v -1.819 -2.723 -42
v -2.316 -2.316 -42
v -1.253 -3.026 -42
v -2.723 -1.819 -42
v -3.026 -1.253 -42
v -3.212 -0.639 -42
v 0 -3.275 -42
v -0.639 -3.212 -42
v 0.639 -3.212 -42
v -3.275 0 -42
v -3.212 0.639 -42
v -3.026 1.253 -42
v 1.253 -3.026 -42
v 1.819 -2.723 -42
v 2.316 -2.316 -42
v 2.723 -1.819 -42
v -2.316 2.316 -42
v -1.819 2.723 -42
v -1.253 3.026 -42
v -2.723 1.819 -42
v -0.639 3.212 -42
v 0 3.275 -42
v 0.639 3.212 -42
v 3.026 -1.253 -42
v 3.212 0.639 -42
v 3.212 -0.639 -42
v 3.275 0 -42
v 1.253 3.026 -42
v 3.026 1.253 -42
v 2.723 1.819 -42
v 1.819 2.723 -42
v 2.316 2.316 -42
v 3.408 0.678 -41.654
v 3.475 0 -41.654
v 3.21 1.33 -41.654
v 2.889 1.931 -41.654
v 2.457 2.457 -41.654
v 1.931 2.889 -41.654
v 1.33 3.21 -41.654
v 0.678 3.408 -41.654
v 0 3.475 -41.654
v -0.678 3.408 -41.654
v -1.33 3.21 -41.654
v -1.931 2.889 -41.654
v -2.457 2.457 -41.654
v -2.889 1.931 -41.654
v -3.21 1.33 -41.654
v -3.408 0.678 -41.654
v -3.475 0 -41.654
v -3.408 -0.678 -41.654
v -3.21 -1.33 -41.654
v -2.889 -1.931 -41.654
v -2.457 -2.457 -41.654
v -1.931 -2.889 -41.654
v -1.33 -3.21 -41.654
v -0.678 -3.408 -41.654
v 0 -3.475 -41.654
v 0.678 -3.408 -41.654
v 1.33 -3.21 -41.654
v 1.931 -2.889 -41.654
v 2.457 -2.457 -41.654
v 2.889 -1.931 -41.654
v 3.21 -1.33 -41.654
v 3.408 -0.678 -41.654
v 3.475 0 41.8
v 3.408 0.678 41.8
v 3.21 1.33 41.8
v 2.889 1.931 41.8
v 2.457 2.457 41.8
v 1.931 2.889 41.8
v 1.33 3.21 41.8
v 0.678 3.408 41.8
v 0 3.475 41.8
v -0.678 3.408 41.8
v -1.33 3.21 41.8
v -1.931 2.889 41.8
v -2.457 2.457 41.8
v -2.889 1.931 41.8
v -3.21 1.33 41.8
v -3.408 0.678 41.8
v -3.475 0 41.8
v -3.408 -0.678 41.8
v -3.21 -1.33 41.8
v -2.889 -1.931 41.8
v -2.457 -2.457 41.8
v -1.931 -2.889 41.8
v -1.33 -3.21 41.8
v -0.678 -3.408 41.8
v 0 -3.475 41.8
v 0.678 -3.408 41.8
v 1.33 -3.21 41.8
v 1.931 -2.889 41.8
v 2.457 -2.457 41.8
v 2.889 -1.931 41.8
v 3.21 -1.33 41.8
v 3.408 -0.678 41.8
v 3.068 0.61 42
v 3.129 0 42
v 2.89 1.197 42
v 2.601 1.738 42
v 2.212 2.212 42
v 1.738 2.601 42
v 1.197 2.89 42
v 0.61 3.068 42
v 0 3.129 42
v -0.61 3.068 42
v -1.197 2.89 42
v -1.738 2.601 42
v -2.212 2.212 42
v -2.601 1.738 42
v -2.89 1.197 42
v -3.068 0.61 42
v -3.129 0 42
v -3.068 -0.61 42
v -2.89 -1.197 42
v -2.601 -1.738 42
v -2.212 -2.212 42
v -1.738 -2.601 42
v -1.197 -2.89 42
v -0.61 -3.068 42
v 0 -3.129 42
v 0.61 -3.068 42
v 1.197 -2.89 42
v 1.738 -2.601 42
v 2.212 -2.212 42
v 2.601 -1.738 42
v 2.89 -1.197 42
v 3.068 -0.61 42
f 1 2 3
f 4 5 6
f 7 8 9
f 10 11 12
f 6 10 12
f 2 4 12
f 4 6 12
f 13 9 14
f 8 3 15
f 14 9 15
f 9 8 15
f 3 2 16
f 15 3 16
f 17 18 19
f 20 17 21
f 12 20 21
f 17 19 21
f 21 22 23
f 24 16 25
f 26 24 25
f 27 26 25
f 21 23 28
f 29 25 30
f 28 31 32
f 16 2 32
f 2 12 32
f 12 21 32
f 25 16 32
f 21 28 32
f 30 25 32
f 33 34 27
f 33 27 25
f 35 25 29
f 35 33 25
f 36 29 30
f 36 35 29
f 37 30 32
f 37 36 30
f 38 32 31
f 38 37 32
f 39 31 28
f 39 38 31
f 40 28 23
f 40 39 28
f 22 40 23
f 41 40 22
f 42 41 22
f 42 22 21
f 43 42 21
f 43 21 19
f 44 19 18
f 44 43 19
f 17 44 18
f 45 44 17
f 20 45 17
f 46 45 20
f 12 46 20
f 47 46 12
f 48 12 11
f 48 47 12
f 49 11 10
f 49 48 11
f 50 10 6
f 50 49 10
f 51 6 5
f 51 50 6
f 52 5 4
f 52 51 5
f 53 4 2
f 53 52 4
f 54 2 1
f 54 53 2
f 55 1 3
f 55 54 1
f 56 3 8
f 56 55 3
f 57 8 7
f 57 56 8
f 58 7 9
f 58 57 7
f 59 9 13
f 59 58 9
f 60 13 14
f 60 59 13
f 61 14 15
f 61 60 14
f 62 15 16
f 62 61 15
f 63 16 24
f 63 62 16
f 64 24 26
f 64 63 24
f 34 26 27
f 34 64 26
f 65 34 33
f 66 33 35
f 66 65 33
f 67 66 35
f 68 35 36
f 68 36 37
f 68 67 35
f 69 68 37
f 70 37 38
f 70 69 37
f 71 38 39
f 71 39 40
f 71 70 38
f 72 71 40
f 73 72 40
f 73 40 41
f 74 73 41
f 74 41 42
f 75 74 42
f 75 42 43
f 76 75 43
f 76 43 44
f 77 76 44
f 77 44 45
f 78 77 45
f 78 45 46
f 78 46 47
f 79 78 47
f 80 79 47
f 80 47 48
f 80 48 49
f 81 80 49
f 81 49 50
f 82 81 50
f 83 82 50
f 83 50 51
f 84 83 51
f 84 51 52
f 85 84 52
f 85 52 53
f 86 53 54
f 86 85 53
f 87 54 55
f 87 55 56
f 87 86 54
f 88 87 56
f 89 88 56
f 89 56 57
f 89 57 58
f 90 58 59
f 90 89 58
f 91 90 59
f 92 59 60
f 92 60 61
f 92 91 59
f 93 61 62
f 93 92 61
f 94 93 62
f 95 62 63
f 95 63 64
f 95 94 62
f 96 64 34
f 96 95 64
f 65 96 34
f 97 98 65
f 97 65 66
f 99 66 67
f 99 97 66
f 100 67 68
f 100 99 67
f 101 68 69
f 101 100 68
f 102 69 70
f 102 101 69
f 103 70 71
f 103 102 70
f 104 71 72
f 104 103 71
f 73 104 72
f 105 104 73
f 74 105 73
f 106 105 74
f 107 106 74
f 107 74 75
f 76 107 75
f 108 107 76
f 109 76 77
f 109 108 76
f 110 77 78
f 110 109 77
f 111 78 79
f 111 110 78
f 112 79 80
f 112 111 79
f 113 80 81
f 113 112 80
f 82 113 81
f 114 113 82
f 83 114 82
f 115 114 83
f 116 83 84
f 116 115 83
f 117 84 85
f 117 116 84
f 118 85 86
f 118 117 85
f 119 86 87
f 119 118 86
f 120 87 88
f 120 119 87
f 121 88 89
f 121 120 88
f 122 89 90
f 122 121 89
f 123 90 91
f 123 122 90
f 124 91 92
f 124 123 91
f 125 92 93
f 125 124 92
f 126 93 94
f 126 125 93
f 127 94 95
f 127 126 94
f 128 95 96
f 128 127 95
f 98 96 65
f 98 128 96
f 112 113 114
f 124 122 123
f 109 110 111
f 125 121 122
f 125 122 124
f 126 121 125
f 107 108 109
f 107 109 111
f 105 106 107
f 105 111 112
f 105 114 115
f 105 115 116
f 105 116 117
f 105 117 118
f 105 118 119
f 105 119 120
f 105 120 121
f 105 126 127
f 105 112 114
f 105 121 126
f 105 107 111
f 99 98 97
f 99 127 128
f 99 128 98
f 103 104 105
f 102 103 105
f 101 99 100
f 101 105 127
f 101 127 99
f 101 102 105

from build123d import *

# Parameters (mm, degrees)
SKETCH1_R             = 3.475
BOSS_EXTRUDE1_DEPTH   = 42
CHAMFER1_SIZE         = 0.2
CHAMFER1_SIZE2        = 0.346410162
CHAMFER1_PART_2_SIZE  = 0.2
CHAMFER1_PART_2_SIZE2 = 0.346410162


with BuildPart() as part:
    # Sketch1 → Boss-Extrude1 (new body, symmetric)
    with BuildSketch(Plane.XY):
        Circle(SKETCH1_R)
    extrude(amount=BOSS_EXTRUDE1_DEPTH, both=True)

    # Chamfer1
    chamfer1_edges = [part.edges().sort_by_distance(p)[0] for p in [
        (-3.475, 0, -42),
    ]]
    chamfer1_side = [part.faces().sort_by_distance(p)[0] for p in [
        (0, 0, -42),
    ]]
    chamfer(chamfer1_edges, length=CHAMFER1_SIZE, length2=CHAMFER1_SIZE2, reference=chamfer1_side[0])

    # Chamfer1 part 2
    chamfer1_part_2_edges = [part.edges().sort_by_distance(p)[0] for p in [
        (-3.475, 0, 42),
    ]]
    chamfer1_part_2_side = [part.faces().sort_by_distance(p)[0] for p in [
        (-3.475, 0, 0),
    ]]
    chamfer(chamfer1_part_2_edges, length=CHAMFER1_PART_2_SIZE, length2=CHAMFER1_PART_2_SIZE2, reference=chamfer1_part_2_side[0])


solid = part.part
